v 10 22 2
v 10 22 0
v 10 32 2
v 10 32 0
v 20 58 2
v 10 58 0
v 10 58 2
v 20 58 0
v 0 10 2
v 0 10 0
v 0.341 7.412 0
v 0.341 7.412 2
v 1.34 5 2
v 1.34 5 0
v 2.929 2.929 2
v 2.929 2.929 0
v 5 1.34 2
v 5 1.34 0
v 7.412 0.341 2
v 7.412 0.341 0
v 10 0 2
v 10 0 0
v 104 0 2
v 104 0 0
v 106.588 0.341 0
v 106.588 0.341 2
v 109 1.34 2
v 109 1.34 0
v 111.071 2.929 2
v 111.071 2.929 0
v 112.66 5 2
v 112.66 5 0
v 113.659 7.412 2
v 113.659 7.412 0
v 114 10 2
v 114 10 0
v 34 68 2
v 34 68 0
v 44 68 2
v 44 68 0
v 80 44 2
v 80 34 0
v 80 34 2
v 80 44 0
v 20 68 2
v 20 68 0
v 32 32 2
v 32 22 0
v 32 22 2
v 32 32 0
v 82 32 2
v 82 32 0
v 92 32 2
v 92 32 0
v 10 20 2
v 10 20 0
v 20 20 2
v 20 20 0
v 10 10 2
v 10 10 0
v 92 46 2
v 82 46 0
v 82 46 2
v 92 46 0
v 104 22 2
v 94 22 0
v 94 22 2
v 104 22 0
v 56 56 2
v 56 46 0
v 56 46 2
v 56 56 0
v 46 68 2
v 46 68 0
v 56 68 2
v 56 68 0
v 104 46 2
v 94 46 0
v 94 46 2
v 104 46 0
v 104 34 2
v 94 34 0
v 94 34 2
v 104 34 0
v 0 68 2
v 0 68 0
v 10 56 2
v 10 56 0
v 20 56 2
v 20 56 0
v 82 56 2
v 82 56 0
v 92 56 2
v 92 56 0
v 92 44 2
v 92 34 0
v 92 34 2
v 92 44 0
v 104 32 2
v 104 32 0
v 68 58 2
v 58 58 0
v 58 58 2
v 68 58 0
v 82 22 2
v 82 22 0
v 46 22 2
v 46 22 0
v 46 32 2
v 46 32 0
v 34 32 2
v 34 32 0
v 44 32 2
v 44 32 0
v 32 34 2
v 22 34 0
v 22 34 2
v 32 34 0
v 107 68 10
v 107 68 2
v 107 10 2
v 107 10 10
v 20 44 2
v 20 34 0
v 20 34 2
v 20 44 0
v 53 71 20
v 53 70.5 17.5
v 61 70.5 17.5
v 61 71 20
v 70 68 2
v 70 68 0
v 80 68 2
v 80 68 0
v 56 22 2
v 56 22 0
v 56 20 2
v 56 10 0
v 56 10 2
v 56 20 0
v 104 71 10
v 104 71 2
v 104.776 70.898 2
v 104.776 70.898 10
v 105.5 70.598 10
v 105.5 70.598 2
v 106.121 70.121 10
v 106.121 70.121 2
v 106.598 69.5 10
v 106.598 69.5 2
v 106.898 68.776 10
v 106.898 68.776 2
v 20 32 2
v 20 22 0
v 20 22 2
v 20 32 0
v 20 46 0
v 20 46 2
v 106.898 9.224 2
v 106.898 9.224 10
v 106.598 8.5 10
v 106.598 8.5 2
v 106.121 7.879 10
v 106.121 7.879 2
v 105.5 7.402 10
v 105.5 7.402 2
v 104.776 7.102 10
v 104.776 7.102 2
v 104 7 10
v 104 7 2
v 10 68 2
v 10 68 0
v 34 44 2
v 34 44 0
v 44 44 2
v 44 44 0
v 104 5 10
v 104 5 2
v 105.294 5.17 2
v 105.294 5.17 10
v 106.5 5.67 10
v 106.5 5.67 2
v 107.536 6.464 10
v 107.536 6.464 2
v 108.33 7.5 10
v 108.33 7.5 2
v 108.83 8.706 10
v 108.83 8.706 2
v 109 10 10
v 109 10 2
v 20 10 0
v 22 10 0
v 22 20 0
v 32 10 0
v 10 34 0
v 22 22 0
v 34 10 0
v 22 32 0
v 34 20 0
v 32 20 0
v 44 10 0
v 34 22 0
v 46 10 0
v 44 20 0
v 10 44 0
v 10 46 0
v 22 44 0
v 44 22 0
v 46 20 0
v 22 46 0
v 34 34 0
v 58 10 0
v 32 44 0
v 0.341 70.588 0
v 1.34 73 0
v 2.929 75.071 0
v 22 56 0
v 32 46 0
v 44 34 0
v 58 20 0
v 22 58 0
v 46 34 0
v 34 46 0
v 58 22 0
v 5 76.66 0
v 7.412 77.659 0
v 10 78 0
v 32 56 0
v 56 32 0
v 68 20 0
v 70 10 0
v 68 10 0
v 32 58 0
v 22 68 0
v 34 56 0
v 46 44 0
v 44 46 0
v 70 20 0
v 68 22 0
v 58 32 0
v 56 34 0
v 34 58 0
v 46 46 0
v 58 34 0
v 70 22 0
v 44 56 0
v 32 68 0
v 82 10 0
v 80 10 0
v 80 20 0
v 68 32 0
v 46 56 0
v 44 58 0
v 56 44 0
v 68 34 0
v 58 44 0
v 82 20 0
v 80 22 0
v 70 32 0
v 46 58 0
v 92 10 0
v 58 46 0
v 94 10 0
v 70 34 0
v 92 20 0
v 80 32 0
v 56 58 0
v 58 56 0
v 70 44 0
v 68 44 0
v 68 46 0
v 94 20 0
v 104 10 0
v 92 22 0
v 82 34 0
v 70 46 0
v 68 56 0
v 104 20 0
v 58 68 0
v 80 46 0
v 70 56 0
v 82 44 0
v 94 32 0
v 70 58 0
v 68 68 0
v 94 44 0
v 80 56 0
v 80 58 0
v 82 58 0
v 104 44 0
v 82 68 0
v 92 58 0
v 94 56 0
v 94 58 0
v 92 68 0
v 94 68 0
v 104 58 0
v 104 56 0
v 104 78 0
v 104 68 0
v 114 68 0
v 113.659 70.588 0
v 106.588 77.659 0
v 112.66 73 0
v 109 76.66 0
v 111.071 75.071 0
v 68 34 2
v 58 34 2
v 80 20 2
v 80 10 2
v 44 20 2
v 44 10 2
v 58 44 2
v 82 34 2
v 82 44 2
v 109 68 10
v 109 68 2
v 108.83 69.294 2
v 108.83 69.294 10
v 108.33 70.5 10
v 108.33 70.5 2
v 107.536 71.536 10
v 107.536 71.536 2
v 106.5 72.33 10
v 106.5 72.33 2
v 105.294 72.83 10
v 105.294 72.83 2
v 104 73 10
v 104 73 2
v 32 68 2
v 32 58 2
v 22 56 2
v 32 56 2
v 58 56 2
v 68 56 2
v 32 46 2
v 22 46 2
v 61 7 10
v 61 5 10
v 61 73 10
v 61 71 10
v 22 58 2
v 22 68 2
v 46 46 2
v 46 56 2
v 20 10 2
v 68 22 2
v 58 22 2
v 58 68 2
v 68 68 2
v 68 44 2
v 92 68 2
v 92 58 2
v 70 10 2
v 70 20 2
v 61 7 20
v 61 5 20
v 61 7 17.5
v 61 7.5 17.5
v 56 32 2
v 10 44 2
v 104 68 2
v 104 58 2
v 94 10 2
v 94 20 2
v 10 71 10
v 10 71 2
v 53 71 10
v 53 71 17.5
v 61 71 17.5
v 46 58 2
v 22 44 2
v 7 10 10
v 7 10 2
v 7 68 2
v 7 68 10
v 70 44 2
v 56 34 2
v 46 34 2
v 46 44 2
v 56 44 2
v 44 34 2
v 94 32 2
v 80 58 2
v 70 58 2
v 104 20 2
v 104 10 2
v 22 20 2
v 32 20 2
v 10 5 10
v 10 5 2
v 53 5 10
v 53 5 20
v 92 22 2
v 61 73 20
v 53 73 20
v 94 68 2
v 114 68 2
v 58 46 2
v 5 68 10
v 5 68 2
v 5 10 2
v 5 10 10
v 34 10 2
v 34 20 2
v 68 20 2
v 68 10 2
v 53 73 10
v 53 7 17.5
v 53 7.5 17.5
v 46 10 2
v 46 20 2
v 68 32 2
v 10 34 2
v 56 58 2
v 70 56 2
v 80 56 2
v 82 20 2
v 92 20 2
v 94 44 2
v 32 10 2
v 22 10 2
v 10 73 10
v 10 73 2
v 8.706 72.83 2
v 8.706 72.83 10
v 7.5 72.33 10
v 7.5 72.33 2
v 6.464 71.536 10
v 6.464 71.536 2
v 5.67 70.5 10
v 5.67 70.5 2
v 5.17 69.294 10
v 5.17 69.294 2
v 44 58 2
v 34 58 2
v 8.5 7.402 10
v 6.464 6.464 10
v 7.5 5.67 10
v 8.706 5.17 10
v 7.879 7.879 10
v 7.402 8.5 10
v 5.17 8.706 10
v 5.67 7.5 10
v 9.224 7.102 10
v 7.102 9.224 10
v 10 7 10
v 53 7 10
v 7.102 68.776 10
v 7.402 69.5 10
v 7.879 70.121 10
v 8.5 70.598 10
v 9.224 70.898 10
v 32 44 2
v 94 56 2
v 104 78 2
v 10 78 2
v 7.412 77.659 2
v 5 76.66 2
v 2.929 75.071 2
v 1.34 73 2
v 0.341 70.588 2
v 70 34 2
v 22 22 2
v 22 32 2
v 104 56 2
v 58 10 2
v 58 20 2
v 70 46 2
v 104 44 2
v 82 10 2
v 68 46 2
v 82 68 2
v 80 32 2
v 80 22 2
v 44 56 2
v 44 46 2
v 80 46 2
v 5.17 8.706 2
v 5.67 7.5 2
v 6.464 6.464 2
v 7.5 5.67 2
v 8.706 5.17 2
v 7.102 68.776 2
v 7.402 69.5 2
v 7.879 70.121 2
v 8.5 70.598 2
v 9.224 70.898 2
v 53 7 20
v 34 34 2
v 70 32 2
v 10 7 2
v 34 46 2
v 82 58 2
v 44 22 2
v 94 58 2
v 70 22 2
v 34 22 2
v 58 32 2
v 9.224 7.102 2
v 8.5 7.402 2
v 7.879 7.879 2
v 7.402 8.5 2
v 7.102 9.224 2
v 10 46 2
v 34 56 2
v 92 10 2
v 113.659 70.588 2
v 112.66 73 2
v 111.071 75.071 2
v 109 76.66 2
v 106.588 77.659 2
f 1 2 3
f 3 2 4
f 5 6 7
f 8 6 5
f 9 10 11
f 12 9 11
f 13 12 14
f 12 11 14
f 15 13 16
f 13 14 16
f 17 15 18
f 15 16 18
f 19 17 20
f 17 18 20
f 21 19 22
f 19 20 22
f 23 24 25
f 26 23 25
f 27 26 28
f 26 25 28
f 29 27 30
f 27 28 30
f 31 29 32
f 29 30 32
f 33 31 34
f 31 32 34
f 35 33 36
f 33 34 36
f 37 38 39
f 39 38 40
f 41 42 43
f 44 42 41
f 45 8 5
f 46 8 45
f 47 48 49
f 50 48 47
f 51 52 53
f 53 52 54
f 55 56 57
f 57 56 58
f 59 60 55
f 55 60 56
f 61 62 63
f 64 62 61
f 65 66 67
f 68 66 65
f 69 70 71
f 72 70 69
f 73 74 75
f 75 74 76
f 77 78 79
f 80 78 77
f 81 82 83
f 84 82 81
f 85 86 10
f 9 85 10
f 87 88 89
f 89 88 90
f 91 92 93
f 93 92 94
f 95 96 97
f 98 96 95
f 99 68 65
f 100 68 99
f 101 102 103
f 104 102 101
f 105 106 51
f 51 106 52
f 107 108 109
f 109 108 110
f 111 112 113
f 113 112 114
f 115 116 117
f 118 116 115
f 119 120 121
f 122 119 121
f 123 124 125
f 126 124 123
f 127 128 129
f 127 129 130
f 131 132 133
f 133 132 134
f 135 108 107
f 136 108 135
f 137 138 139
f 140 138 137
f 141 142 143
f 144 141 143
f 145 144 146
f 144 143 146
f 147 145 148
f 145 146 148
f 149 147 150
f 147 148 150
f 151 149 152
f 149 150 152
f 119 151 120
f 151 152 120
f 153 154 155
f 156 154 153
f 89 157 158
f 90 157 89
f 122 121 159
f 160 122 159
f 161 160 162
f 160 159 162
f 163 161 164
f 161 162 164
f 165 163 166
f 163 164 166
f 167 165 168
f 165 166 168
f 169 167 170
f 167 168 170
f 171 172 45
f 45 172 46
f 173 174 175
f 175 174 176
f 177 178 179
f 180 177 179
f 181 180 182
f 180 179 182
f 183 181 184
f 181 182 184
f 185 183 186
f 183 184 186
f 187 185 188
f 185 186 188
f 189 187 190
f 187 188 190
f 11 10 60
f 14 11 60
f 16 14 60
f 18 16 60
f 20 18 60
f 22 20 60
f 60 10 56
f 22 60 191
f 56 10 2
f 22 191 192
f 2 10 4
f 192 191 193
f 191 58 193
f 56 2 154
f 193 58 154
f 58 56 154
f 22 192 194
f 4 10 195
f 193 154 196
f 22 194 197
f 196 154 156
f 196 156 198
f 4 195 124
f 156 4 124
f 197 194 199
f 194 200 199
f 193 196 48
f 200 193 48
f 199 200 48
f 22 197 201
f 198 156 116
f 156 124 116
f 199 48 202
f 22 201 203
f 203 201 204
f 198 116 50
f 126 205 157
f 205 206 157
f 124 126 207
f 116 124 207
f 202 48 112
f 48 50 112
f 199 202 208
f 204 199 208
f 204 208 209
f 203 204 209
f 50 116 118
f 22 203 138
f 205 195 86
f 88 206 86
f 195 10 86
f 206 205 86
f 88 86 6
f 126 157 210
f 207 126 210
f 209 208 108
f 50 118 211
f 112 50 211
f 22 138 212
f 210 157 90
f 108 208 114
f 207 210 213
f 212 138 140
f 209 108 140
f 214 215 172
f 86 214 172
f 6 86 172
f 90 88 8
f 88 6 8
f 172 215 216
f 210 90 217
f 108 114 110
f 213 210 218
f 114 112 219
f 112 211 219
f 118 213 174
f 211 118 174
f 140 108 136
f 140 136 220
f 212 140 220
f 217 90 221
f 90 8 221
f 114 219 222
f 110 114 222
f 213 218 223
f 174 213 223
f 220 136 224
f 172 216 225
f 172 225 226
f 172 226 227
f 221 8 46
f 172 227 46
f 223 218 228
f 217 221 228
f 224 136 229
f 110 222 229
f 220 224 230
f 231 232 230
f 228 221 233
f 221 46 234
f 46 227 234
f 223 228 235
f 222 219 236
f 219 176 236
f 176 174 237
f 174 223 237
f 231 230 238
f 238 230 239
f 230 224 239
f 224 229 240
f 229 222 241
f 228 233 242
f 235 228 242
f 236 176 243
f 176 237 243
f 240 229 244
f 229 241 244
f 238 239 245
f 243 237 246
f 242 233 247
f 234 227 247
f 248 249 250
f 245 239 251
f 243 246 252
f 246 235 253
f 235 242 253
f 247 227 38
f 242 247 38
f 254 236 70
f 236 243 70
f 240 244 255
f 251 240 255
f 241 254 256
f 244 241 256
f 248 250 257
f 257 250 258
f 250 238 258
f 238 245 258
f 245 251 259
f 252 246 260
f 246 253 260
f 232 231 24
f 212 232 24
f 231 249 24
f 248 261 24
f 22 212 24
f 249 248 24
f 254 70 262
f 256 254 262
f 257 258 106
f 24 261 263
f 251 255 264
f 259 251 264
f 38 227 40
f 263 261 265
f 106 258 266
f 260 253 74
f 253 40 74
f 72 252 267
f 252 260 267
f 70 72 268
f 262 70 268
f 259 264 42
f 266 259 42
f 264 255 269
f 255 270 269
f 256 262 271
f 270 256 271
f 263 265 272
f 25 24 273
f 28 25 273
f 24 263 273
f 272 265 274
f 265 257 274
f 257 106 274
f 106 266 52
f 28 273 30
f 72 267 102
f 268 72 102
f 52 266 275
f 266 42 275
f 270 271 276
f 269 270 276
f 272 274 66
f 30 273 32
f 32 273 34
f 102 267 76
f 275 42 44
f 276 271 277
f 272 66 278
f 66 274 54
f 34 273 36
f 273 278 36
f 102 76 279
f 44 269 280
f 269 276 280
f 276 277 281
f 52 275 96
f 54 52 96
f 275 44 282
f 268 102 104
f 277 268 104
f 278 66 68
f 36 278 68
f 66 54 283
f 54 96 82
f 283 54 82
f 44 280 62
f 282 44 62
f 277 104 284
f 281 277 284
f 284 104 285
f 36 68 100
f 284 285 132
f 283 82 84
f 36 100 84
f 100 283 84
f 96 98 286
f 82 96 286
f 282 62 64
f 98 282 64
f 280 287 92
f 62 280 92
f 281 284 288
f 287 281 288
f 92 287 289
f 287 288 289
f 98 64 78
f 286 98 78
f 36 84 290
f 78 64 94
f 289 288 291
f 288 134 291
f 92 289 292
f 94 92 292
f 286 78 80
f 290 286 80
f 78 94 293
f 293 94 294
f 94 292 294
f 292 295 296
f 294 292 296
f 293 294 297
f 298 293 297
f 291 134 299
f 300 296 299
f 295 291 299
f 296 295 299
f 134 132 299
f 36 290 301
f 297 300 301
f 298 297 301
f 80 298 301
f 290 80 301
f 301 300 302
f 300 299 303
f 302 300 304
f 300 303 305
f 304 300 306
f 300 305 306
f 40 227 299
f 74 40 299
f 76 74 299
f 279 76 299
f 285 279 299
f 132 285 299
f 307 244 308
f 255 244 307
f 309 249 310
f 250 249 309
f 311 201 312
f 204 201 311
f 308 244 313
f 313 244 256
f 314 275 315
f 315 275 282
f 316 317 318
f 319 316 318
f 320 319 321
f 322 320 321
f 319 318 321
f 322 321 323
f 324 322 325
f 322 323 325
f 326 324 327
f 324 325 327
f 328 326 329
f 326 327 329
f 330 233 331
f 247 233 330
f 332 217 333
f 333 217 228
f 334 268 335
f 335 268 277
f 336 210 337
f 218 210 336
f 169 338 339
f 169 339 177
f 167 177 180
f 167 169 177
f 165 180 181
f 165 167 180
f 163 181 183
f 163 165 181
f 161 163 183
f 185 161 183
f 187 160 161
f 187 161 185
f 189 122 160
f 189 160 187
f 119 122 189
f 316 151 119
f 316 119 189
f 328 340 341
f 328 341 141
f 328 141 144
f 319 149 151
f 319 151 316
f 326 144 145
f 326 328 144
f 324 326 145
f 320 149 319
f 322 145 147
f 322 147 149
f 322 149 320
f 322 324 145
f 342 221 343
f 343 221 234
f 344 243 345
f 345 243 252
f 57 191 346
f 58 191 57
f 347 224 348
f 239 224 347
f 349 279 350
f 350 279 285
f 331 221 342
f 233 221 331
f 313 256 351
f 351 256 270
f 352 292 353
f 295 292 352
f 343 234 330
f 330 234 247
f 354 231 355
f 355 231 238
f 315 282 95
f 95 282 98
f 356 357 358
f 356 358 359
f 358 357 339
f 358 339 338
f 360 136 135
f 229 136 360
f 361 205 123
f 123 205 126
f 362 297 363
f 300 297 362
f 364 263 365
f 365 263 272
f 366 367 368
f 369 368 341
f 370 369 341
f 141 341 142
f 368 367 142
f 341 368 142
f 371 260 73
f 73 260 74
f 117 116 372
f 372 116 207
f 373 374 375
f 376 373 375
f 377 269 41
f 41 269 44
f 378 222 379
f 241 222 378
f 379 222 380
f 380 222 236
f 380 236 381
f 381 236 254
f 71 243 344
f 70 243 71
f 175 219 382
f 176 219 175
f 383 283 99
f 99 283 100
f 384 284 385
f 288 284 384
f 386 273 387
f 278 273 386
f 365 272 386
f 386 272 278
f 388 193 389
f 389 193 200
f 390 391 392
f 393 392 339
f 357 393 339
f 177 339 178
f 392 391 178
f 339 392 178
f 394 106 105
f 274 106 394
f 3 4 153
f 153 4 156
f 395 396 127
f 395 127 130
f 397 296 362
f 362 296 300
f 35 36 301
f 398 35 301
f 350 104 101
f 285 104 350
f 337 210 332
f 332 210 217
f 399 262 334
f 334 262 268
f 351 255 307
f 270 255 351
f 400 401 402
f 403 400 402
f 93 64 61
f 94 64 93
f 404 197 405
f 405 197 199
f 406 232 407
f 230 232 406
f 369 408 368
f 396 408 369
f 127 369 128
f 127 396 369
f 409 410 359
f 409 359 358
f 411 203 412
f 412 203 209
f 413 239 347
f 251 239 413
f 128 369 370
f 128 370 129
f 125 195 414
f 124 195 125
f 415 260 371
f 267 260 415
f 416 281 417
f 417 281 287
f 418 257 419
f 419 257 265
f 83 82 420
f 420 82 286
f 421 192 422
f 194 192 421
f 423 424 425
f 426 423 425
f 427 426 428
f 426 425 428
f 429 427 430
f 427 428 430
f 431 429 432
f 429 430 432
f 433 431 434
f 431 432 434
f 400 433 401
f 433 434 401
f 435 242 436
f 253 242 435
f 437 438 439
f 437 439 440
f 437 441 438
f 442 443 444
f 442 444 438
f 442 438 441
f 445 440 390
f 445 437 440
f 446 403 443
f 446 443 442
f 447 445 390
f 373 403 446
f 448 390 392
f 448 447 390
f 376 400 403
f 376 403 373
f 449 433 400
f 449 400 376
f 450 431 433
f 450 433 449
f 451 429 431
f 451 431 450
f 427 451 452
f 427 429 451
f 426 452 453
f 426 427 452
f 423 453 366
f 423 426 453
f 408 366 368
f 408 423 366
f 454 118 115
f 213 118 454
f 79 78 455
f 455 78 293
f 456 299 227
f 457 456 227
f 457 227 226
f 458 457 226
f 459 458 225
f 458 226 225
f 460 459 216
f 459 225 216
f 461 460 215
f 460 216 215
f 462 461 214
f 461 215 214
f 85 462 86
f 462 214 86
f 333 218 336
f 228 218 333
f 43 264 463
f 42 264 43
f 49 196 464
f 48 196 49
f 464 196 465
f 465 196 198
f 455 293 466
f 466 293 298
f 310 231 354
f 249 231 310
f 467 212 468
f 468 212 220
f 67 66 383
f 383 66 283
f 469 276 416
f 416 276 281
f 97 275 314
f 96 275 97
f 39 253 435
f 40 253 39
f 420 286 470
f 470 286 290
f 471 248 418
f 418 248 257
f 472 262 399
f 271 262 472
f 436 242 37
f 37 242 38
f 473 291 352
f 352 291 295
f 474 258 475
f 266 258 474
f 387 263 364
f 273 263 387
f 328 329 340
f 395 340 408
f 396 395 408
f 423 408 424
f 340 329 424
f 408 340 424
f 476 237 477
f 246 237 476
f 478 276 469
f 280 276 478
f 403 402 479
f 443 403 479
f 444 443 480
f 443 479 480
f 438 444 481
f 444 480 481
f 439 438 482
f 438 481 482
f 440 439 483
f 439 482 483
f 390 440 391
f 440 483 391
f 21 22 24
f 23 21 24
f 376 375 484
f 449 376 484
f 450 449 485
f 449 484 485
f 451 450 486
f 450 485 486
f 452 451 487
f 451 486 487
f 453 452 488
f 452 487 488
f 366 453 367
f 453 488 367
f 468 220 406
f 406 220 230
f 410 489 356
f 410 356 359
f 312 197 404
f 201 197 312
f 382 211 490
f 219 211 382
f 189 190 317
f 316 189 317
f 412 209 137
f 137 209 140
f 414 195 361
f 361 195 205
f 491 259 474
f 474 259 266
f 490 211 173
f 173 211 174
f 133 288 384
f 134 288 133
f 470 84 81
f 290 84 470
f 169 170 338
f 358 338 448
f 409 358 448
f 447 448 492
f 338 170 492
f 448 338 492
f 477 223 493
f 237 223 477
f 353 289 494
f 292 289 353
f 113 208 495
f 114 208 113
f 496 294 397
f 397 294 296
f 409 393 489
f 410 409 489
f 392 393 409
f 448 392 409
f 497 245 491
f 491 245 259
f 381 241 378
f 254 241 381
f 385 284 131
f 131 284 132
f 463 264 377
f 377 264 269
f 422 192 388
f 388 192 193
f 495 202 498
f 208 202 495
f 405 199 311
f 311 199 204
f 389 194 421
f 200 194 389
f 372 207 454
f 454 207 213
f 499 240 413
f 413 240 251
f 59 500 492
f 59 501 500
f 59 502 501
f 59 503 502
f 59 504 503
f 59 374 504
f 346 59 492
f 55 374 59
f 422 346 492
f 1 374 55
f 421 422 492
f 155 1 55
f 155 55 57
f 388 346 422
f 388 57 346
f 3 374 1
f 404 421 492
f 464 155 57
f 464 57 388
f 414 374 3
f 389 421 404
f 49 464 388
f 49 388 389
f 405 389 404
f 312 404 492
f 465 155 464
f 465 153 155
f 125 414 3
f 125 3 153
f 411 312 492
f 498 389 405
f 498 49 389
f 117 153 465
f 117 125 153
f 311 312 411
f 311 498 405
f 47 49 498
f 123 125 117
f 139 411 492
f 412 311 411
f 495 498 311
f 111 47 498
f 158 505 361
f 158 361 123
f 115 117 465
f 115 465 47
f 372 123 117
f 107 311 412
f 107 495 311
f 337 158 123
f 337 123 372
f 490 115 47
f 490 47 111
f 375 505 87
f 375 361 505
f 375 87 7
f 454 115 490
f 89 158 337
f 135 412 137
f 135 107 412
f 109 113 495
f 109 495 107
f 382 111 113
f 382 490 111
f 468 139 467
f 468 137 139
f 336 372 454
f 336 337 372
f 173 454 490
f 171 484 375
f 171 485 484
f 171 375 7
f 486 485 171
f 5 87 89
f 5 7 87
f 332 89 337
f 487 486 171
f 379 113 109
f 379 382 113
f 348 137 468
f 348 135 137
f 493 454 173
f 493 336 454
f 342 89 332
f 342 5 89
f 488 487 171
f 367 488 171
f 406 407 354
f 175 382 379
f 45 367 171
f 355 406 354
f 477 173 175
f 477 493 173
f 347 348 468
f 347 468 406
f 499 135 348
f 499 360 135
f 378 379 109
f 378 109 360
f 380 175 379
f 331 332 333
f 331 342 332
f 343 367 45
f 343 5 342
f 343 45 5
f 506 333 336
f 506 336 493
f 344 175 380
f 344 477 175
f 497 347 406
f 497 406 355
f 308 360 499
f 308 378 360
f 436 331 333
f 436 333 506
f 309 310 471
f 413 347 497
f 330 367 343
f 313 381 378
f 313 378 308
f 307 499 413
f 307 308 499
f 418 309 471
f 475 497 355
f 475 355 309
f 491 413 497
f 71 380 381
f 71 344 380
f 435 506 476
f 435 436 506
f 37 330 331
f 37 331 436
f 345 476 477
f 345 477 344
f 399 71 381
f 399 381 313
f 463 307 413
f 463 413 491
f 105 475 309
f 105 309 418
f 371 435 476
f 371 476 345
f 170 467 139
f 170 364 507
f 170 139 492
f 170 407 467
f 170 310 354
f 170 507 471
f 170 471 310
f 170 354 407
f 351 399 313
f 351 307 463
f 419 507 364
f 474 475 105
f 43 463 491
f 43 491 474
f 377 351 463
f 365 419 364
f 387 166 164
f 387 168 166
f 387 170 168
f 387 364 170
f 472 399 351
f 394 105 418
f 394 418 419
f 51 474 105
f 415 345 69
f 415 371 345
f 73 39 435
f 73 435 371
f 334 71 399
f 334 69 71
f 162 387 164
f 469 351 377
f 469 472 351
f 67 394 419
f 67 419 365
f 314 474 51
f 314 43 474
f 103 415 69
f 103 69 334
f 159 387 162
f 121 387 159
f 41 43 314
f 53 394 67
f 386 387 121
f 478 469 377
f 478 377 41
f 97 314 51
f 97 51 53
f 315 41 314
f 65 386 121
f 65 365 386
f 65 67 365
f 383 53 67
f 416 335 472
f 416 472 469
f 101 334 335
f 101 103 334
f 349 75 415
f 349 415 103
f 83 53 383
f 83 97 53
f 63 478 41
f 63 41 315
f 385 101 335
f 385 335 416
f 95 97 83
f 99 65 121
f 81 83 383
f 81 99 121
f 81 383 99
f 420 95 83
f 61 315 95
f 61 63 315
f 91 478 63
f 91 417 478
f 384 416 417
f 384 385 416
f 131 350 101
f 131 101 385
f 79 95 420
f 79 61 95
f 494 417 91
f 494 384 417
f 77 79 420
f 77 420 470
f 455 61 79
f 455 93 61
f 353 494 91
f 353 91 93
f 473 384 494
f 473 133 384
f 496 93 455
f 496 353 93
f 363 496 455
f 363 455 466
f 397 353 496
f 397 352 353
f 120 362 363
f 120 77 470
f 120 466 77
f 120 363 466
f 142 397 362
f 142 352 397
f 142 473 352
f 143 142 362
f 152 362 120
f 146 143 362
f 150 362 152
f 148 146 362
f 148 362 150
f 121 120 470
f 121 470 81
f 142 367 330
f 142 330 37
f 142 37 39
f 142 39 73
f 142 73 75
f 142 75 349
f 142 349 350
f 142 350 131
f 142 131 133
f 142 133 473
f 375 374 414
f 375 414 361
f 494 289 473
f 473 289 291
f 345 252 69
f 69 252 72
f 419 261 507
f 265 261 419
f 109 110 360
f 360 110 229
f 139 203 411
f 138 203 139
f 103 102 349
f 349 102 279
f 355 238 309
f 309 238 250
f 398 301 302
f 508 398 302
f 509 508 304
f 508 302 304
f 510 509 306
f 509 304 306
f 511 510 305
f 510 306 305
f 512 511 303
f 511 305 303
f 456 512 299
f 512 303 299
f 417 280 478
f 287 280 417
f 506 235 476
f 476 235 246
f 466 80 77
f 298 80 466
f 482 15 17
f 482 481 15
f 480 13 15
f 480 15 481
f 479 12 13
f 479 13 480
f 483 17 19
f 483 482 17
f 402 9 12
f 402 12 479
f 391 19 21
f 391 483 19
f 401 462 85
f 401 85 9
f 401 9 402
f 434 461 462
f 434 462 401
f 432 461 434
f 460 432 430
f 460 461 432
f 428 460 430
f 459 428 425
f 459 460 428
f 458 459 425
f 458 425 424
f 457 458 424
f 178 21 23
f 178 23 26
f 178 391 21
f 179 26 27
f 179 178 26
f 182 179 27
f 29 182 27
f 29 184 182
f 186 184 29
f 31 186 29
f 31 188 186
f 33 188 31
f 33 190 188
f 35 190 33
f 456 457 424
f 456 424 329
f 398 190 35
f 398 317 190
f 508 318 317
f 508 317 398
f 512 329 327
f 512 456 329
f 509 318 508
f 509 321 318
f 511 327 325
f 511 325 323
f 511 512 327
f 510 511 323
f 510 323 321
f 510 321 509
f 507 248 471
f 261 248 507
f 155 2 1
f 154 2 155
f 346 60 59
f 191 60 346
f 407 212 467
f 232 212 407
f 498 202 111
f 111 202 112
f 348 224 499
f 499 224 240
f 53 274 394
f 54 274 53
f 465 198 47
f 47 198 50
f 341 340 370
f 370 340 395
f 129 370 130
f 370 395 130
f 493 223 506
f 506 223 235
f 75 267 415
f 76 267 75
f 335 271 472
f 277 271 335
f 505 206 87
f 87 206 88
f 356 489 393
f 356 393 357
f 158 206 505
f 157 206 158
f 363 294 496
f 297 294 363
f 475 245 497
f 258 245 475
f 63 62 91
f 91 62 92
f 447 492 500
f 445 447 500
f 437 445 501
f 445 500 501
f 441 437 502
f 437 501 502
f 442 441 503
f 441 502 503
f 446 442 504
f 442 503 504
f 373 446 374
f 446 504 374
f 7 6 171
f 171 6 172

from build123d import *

# Parameters (mm, degrees)
F0_W     = 10
F0_H     = 10
F1_DEPTH = 2
F2_DEPTH = 10
F3_W     = 8
F3_H     = 2
F4_DEPTH = 10
F6_DEPTH = 8


with BuildPart() as f1:
    # F0 (on Top) → F1 (new body)
    with BuildSketch(Plane.XY):
        with BuildLine():
            ThreePointArc((0, 10), (2.9289321881, 2.9289321881), (10, 0))
            Line((10, 0), (104, 0))
            ThreePointArc((104, 0), (111.0710678119, 2.9289321881), (114, 10))
            Line((114, 10), (114, 68))
            ThreePointArc((114, 68), (111.0710678119, 75.0710678119), (104, 78))
            Line((104, 78), (10, 78))
            ThreePointArc((10, 78), (2.9289321881, 75.0710678119), (0, 68))
            Line((0, 68), (0, 10))
        make_face()
        with BuildLine():
            ThreePointArc((10, 5), (6.4644660941, 6.4644660941), (5, 10))
            Line((5, 10), (5, 68))
            ThreePointArc((5, 68), (6.4644660941, 71.5355339059), (10, 73))
            Line((10, 73), (104, 73))
            ThreePointArc((104, 73), (107.5355339059, 71.5355339059), (109, 68))
            Line((109, 68), (109, 10))
            ThreePointArc((109, 10), (107.5355339059, 6.4644660941), (104, 5))
            Line((104, 5), (10, 5))
        make_face(mode=Mode.SUBTRACT)
        with BuildLine():
            Line((5, 68), (5, 10))
            ThreePointArc((5, 10), (6.4644660941, 6.4644660941), (10, 5))
            Line((10, 5), (104, 5))
            ThreePointArc((104, 5), (107.5355339059, 6.4644660941), (109, 10))
            Line((109, 10), (109, 68))
            ThreePointArc((109, 68), (107.5355339059, 71.5355339059), (104, 73))
            Line((104, 73), (10, 73))
            ThreePointArc((10, 73), (6.4644660941, 71.5355339059), (5, 68))
        make_face()
        with BuildLine():
            ThreePointArc((10, 7), (7.8786796564, 7.8786796564), (7, 10))
            Line((7, 10), (7, 68))
            ThreePointArc((7, 68), (7.8786796564, 70.1213203436), (10, 71))
            Line((10, 71), (104, 71))
            ThreePointArc((104, 71), (106.1213203436, 70.1213203436), (107, 68))
            Line((107, 68), (107, 10))
            ThreePointArc((107, 10), (106.1213203436, 7.8786796564), (104, 7))
            Line((104, 7), (10, 7))
        make_face(mode=Mode.SUBTRACT)
        with BuildLine():
            Line((7, 68), (7, 10))
            ThreePointArc((7, 10), (7.8786796564, 7.8786796564), (10, 7))
            Line((10, 7), (104, 7))
            ThreePointArc((104, 7), (106.1213203436, 7.8786796564), (107, 10))
            Line((107, 10), (107, 68))
            ThreePointArc((107, 68), (106.1213203436, 70.1213203436), (104, 71))
            Line((104, 71), (10, 71))
            ThreePointArc((10, 71), (7.8786796564, 70.1213203436), (7, 68))
        make_face()
        with Locations((15, 15)):
            Rectangle(F0_W, F0_H, mode=Mode.SUBTRACT)
        with Locations((27, 15)):
            Rectangle(F0_W, F0_H, mode=Mode.SUBTRACT)
        with Locations((39, 15)):
            Rectangle(F0_W, F0_H, mode=Mode.SUBTRACT)
        with Locations((51, 15)):
            Rectangle(F0_W, F0_H, mode=Mode.SUBTRACT)
        with Locations((15, 27)):
            Rectangle(F0_W, F0_H, mode=Mode.SUBTRACT)
        with Locations((27, 27)):
            Rectangle(F0_W, F0_H, mode=Mode.SUBTRACT)
        with Locations((39, 27)):
            Rectangle(F0_W, F0_H, mode=Mode.SUBTRACT)
        with Locations((51, 27)):
            Rectangle(F0_W, F0_H, mode=Mode.SUBTRACT)
        with Locations((63, 15)):
            Rectangle(F0_W, F0_H, mode=Mode.SUBTRACT)
        with Locations((75, 15)):
            Rectangle(F0_W, F0_H, mode=Mode.SUBTRACT)
        with Locations((87, 15)):
            Rectangle(F0_W, F0_H, mode=Mode.SUBTRACT)
        with Locations((99, 15)):
            Rectangle(F0_W, F0_H, mode=Mode.SUBTRACT)
        with Locations((63, 27)):
            Rectangle(F0_W, F0_H, mode=Mode.SUBTRACT)
        with Locations((75, 27)):
            Rectangle(F0_W, F0_H, mode=Mode.SUBTRACT)
        with Locations((87, 27)):
            Rectangle(F0_W, F0_H, mode=Mode.SUBTRACT)
        with Locations((99, 27)):
            Rectangle(F0_W, F0_H, mode=Mode.SUBTRACT)
        with Locations((15, 39)):
            Rectangle(F0_W, F0_H, mode=Mode.SUBTRACT)
        with Locations((27, 39)):
            Rectangle(F0_W, F0_H, mode=Mode.SUBTRACT)
        with Locations((15, 51)):
            Rectangle(F0_W, F0_H, mode=Mode.SUBTRACT)
        with Locations((27, 51)):
            Rectangle(F0_W, F0_H, mode=Mode.SUBTRACT)
        with Locations((39, 39)):
            Rectangle(F0_W, F0_H, mode=Mode.SUBTRACT)
        with Locations((51, 39)):
            Rectangle(F0_W, F0_H, mode=Mode.SUBTRACT)
        with Locations((39, 51)):
            Rectangle(F0_W, F0_H, mode=Mode.SUBTRACT)
        with Locations((51, 51)):
            Rectangle(F0_W, F0_H, mode=Mode.SUBTRACT)
        with Locations((15, 63)):
            Rectangle(F0_W, F0_H, mode=Mode.SUBTRACT)
        with Locations((27, 63)):
            Rectangle(F0_W, F0_H, mode=Mode.SUBTRACT)
        with Locations((39, 63)):
            Rectangle(F0_W, F0_H, mode=Mode.SUBTRACT)
        with Locations((51, 63)):
            Rectangle(F0_W, F0_H, mode=Mode.SUBTRACT)
        with Locations((63, 39)):
            Rectangle(F0_W, F0_H, mode=Mode.SUBTRACT)
        with Locations((75, 39)):
            Rectangle(F0_W, F0_H, mode=Mode.SUBTRACT)
        with Locations((63, 51)):
            Rectangle(F0_W, F0_H, mode=Mode.SUBTRACT)
        with Locations((75, 51)):
            Rectangle(F0_W, F0_H, mode=Mode.SUBTRACT)
        with Locations((87, 39)):
            Rectangle(F0_W, F0_H, mode=Mode.SUBTRACT)
        with Locations((99, 39)):
            Rectangle(F0_W, F0_H, mode=Mode.SUBTRACT)
        with Locations((87, 51)):
            Rectangle(F0_W, F0_H, mode=Mode.SUBTRACT)
        with Locations((99, 51)):
            Rectangle(F0_W, F0_H, mode=Mode.SUBTRACT)
        with Locations((63, 63)):
            Rectangle(F0_W, F0_H, mode=Mode.SUBTRACT)
        with Locations((75, 63)):
            Rectangle(F0_W, F0_H, mode=Mode.SUBTRACT)
        with Locations((87, 63)):
            Rectangle(F0_W, F0_H, mode=Mode.SUBTRACT)
        with Locations((99, 63)):
            Rectangle(F0_W, F0_H, mode=Mode.SUBTRACT)
    extrude(amount=F1_DEPTH)

    # F0 (on Top) → F2 (join)
    with BuildSketch(Plane.XY):
        with BuildLine():
            Line((5, 68), (5, 10))
            ThreePointArc((5, 10), (6.4644660941, 6.4644660941), (10, 5))
            Line((10, 5), (104, 5))
            ThreePointArc((104, 5), (107.5355339059, 6.4644660941), (109, 10))
            Line((109, 10), (109, 68))
            ThreePointArc((109, 68), (107.5355339059, 71.5355339059), (104, 73))
            Line((104, 73), (10, 73))
            ThreePointArc((10, 73), (6.4644660941, 71.5355339059), (5, 68))
        make_face()
        with BuildLine():
            ThreePointArc((10, 7), (7.8786796564, 7.8786796564), (7, 10))
            Line((7, 10), (7, 68))
            ThreePointArc((7, 68), (7.8786796564, 70.1213203436), (10, 71))
            Line((10, 71), (104, 71))
            ThreePointArc((104, 71), (106.1213203436, 70.1213203436), (107, 68))
            Line((107, 68), (107, 10))
            ThreePointArc((107, 10), (106.1213203436, 7.8786796564), (104, 7))
            Line((104, 7), (10, 7))
        make_face(mode=Mode.SUBTRACT)
    extrude(amount=F2_DEPTH)

    # F3 (on face) → F4 (join)
    with BuildSketch(Plane.XY.offset(10)):
        with Locations((57, 72)):
            Rectangle(F3_W, F3_H)
        with Locations((57, 6)):
            Rectangle(F3_W, F3_H)
    extrude(amount=F4_DEPTH)

    # F5 (on face) → F6 (join, through all)
    with BuildSketch(Plane(origin=(53, 0, 0), x_dir=(0, -1, 0), z_dir=(-1, 0, 0))):
        Polygon((-70.5, 17.5), (-71, 20), (-71, 17.5), align=None)
        Polygon((-7, 20), (-7.5, 17.5), (-7, 17.5), align=None)
    extrude(amount=-F6_DEPTH)


solid = f1.part
